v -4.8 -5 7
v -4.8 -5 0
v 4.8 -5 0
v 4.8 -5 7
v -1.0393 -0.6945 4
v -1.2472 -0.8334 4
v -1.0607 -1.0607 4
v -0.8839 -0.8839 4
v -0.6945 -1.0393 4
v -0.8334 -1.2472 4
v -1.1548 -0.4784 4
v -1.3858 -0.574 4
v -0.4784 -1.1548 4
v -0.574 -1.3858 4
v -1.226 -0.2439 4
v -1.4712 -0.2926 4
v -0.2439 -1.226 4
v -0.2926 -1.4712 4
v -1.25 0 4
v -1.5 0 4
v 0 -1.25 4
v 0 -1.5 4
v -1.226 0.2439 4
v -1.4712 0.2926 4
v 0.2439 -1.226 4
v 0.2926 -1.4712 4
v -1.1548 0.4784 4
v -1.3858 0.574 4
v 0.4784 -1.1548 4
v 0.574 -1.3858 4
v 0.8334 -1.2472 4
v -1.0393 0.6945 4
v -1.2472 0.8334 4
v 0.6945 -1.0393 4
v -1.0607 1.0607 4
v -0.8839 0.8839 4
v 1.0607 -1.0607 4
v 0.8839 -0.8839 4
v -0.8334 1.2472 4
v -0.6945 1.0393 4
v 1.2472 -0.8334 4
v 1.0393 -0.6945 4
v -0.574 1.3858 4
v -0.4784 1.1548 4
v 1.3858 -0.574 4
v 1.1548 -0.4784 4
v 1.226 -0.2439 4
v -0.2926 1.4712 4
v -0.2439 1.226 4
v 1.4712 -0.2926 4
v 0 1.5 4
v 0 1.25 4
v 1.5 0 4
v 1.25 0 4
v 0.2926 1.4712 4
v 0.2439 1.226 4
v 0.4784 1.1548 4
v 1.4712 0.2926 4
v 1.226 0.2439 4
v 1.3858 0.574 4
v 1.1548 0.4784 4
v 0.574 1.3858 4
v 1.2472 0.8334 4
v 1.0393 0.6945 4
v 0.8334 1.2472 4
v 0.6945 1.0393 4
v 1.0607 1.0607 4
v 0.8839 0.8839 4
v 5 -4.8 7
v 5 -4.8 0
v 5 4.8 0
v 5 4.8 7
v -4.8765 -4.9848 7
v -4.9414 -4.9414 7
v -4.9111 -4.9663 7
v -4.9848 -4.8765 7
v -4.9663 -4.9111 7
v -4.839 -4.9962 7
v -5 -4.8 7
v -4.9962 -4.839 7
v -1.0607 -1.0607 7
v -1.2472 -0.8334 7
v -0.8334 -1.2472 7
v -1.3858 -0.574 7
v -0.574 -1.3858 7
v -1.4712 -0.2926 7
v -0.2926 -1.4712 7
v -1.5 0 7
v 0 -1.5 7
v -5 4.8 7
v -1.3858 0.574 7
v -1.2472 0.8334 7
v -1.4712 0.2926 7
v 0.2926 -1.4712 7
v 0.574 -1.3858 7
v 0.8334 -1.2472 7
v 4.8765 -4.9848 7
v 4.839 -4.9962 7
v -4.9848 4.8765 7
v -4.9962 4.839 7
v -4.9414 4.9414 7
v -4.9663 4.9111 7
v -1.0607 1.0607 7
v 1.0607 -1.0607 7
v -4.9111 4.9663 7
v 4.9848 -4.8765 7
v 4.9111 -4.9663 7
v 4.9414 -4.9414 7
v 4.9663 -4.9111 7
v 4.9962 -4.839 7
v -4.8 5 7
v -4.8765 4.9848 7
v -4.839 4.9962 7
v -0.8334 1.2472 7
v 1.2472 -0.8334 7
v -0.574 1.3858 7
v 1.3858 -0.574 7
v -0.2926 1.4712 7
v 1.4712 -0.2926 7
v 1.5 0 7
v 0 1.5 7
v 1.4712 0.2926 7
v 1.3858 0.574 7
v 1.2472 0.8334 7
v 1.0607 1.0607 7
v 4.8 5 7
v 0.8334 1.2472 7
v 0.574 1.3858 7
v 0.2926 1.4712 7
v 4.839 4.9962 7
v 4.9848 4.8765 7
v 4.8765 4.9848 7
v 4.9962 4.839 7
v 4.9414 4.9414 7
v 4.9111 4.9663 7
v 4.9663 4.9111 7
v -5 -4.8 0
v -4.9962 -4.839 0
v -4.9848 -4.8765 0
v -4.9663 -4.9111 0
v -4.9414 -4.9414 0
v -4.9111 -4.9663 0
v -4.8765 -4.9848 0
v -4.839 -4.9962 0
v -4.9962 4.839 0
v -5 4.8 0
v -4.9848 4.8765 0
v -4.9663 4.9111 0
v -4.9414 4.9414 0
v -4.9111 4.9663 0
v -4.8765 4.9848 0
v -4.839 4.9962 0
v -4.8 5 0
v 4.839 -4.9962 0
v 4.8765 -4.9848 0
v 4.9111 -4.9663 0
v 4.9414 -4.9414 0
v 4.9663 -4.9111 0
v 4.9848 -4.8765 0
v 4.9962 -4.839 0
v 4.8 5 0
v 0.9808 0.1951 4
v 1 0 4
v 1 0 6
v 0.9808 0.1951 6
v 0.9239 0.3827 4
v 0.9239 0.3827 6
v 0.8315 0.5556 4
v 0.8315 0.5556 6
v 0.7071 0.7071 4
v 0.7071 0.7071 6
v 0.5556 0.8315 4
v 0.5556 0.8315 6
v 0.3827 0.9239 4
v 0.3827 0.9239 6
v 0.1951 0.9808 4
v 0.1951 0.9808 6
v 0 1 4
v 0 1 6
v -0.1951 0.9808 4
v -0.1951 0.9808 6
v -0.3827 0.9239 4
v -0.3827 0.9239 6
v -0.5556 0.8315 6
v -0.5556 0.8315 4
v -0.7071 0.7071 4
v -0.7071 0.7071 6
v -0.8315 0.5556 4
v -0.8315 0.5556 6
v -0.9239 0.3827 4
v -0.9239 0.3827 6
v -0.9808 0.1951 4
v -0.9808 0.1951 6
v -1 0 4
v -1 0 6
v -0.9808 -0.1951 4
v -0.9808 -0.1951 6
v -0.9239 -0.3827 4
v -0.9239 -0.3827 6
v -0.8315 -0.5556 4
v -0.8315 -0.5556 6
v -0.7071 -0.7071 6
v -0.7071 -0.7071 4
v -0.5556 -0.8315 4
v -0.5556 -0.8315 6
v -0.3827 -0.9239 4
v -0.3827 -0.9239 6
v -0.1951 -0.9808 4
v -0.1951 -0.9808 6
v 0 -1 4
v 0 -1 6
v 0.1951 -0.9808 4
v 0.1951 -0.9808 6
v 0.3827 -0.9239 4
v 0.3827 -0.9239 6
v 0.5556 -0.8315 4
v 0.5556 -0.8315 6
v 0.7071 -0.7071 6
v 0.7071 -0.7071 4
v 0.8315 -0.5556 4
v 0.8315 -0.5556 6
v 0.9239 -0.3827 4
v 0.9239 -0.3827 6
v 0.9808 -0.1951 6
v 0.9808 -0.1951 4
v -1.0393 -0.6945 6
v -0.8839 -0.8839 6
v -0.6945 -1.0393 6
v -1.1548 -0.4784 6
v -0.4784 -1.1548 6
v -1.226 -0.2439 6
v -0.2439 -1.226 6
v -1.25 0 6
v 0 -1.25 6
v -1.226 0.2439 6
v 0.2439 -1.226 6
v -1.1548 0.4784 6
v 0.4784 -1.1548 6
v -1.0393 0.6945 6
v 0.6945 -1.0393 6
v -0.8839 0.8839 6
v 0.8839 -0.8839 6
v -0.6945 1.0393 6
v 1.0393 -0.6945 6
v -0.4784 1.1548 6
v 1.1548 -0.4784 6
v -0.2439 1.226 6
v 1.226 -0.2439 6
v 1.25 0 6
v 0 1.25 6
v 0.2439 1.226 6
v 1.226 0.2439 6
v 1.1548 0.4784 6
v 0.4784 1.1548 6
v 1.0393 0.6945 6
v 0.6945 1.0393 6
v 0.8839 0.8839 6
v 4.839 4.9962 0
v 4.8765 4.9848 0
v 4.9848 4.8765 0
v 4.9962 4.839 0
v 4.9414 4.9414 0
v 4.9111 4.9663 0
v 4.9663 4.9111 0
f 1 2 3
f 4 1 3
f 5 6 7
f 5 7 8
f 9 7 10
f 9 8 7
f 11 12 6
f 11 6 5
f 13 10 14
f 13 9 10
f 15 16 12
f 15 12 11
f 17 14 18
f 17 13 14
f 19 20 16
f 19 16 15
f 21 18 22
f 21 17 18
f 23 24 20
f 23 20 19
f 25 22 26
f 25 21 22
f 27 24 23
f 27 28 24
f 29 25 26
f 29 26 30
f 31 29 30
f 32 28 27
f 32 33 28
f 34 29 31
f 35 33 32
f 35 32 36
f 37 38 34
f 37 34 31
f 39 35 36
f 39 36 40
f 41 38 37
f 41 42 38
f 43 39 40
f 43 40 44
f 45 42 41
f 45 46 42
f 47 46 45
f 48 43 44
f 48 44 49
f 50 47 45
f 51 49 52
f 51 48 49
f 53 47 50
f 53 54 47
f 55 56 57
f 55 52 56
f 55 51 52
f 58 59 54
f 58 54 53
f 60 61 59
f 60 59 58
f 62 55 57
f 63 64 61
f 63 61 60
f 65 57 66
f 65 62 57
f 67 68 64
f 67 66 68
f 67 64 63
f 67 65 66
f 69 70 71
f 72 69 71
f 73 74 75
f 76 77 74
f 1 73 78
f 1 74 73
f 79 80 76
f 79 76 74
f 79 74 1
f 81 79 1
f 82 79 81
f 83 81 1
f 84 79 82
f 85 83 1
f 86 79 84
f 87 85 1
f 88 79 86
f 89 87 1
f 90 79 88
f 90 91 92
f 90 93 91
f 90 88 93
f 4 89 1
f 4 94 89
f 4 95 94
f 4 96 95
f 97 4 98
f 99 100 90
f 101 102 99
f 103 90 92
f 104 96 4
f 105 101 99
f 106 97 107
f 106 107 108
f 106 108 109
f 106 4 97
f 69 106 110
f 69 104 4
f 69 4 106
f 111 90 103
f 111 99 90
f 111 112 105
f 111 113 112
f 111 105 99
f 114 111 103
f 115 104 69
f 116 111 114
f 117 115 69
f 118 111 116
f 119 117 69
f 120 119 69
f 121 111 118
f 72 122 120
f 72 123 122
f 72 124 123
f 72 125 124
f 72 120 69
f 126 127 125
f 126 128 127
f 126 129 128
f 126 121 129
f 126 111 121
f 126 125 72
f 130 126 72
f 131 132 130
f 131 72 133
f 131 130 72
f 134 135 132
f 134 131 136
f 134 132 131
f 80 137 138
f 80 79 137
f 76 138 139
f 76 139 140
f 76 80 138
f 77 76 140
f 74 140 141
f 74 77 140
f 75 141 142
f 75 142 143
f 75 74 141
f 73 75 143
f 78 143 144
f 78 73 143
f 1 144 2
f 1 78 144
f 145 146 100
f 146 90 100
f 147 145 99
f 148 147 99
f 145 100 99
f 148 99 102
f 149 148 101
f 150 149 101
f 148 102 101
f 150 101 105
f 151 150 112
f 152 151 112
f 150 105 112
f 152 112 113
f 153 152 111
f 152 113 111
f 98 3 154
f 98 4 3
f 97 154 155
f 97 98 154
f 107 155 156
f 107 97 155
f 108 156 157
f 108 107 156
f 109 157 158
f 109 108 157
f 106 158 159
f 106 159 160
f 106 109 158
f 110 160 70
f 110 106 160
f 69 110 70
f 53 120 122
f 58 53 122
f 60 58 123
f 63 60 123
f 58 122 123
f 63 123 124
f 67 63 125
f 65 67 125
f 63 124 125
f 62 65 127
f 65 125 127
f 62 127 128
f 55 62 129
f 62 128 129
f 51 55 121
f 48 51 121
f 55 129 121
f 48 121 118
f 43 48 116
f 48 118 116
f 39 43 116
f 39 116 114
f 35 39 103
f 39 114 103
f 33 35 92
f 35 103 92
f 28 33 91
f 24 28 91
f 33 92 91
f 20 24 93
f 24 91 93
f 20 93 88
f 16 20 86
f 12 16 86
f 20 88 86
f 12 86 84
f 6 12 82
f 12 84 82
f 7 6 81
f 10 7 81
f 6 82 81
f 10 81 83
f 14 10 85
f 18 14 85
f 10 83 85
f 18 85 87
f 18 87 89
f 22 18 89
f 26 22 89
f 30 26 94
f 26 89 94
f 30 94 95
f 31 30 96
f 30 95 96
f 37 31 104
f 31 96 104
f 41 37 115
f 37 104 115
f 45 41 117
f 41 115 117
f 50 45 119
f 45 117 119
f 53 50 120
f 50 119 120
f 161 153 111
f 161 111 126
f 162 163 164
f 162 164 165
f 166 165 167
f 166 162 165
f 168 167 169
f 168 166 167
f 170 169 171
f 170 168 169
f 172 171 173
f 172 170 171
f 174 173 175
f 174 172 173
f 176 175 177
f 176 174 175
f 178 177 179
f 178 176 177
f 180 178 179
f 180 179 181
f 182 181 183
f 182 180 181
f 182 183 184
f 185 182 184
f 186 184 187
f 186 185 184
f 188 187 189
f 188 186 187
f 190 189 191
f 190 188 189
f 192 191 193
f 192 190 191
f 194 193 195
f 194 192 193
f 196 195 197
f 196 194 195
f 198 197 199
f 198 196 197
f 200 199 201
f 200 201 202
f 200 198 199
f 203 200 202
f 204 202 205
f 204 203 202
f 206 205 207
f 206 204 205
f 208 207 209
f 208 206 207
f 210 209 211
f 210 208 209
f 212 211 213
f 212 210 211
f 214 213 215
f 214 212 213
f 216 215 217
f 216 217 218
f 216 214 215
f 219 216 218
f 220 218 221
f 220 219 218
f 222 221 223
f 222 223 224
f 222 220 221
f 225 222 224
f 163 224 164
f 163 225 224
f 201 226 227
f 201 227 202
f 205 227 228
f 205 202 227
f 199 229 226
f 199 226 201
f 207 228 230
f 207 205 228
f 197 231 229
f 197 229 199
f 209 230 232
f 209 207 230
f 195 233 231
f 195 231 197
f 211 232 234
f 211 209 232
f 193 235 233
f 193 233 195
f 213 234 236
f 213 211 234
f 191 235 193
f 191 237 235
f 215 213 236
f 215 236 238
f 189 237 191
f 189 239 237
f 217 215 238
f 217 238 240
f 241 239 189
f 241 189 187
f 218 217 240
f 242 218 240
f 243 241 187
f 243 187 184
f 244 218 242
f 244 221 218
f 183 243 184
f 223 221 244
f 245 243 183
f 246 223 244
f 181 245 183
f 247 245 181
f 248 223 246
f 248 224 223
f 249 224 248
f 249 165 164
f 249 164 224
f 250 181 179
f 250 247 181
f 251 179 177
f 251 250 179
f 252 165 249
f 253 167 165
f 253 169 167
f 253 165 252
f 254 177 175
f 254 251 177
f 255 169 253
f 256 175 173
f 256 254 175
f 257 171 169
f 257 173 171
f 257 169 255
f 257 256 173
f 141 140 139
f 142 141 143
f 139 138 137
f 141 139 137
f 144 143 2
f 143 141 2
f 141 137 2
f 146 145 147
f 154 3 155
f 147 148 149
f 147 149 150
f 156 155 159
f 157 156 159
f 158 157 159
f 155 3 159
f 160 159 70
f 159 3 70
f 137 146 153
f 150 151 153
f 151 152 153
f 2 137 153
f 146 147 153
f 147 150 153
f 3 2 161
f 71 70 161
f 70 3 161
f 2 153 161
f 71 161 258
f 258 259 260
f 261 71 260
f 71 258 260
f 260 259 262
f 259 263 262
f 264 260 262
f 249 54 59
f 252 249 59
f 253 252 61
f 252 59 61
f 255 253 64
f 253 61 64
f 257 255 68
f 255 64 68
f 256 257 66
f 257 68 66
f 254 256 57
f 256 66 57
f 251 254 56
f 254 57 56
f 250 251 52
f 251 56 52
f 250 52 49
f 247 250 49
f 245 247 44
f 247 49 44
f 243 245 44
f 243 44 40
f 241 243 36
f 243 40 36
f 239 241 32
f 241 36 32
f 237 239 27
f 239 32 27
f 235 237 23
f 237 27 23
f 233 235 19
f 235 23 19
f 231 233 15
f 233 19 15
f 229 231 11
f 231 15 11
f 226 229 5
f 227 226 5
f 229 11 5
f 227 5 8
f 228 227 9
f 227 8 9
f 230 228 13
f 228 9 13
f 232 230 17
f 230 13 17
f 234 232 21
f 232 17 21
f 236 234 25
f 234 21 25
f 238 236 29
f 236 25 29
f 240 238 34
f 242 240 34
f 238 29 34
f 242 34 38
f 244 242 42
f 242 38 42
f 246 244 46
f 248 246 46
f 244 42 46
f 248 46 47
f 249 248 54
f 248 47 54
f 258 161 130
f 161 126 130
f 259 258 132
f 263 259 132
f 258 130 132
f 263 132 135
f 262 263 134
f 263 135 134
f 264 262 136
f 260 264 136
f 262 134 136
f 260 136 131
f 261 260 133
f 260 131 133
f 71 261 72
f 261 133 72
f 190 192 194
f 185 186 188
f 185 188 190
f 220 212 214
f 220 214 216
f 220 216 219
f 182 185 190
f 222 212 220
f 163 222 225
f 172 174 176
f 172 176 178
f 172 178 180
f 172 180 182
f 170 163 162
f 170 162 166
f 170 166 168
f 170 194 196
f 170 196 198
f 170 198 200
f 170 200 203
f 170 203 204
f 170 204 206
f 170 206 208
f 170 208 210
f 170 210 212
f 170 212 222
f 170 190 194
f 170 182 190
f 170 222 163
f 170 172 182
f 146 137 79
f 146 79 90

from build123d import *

# Parameters (mm, degrees)
SKETCH1_W           = 10
SKETCH1_H           = 10
BOSS_EXTRUDE1_DEPTH = 7
SKETCH2_R           = 1.5
CUT_EXTRUDE1_DEPTH  = 3
SKETCH3_R           = 1.25
SKETCH3_R_2         = 1
BOSS_EXTRUDE2_DEPTH = 2
FILLET1_R           = 0.2


with BuildPart() as part:
    # Sketch1 → Boss-Extrude1 (new body)
    with BuildSketch(Plane.XY):
        Rectangle(SKETCH1_W, SKETCH1_H)
    extrude(amount=BOSS_EXTRUDE1_DEPTH)

    # Sketch2 → Cut-Extrude1 (cut)
    with BuildSketch(Plane.XY.offset(7)):
        Circle(SKETCH2_R)
    extrude(amount=-CUT_EXTRUDE1_DEPTH, mode=Mode.SUBTRACT)

    # Sketch3 → Boss-Extrude2 (add)
    with BuildSketch(Plane.XY.offset(4)):
        Circle(SKETCH3_R)
        Circle(SKETCH3_R_2, mode=Mode.SUBTRACT)
    extrude(amount=BOSS_EXTRUDE2_DEPTH)

    # Fillet1
    fillet1_edges = [part.edges().sort_by_distance(p)[0] for p in [
        (-5, 5, 3.5),
        (5, 5, 3.5),
        (5, -5, 3.5),
        (-5, -5, 3.5),
    ]]
    fillet(fillet1_edges, radius=FILLET1_R)


solid = part.part
